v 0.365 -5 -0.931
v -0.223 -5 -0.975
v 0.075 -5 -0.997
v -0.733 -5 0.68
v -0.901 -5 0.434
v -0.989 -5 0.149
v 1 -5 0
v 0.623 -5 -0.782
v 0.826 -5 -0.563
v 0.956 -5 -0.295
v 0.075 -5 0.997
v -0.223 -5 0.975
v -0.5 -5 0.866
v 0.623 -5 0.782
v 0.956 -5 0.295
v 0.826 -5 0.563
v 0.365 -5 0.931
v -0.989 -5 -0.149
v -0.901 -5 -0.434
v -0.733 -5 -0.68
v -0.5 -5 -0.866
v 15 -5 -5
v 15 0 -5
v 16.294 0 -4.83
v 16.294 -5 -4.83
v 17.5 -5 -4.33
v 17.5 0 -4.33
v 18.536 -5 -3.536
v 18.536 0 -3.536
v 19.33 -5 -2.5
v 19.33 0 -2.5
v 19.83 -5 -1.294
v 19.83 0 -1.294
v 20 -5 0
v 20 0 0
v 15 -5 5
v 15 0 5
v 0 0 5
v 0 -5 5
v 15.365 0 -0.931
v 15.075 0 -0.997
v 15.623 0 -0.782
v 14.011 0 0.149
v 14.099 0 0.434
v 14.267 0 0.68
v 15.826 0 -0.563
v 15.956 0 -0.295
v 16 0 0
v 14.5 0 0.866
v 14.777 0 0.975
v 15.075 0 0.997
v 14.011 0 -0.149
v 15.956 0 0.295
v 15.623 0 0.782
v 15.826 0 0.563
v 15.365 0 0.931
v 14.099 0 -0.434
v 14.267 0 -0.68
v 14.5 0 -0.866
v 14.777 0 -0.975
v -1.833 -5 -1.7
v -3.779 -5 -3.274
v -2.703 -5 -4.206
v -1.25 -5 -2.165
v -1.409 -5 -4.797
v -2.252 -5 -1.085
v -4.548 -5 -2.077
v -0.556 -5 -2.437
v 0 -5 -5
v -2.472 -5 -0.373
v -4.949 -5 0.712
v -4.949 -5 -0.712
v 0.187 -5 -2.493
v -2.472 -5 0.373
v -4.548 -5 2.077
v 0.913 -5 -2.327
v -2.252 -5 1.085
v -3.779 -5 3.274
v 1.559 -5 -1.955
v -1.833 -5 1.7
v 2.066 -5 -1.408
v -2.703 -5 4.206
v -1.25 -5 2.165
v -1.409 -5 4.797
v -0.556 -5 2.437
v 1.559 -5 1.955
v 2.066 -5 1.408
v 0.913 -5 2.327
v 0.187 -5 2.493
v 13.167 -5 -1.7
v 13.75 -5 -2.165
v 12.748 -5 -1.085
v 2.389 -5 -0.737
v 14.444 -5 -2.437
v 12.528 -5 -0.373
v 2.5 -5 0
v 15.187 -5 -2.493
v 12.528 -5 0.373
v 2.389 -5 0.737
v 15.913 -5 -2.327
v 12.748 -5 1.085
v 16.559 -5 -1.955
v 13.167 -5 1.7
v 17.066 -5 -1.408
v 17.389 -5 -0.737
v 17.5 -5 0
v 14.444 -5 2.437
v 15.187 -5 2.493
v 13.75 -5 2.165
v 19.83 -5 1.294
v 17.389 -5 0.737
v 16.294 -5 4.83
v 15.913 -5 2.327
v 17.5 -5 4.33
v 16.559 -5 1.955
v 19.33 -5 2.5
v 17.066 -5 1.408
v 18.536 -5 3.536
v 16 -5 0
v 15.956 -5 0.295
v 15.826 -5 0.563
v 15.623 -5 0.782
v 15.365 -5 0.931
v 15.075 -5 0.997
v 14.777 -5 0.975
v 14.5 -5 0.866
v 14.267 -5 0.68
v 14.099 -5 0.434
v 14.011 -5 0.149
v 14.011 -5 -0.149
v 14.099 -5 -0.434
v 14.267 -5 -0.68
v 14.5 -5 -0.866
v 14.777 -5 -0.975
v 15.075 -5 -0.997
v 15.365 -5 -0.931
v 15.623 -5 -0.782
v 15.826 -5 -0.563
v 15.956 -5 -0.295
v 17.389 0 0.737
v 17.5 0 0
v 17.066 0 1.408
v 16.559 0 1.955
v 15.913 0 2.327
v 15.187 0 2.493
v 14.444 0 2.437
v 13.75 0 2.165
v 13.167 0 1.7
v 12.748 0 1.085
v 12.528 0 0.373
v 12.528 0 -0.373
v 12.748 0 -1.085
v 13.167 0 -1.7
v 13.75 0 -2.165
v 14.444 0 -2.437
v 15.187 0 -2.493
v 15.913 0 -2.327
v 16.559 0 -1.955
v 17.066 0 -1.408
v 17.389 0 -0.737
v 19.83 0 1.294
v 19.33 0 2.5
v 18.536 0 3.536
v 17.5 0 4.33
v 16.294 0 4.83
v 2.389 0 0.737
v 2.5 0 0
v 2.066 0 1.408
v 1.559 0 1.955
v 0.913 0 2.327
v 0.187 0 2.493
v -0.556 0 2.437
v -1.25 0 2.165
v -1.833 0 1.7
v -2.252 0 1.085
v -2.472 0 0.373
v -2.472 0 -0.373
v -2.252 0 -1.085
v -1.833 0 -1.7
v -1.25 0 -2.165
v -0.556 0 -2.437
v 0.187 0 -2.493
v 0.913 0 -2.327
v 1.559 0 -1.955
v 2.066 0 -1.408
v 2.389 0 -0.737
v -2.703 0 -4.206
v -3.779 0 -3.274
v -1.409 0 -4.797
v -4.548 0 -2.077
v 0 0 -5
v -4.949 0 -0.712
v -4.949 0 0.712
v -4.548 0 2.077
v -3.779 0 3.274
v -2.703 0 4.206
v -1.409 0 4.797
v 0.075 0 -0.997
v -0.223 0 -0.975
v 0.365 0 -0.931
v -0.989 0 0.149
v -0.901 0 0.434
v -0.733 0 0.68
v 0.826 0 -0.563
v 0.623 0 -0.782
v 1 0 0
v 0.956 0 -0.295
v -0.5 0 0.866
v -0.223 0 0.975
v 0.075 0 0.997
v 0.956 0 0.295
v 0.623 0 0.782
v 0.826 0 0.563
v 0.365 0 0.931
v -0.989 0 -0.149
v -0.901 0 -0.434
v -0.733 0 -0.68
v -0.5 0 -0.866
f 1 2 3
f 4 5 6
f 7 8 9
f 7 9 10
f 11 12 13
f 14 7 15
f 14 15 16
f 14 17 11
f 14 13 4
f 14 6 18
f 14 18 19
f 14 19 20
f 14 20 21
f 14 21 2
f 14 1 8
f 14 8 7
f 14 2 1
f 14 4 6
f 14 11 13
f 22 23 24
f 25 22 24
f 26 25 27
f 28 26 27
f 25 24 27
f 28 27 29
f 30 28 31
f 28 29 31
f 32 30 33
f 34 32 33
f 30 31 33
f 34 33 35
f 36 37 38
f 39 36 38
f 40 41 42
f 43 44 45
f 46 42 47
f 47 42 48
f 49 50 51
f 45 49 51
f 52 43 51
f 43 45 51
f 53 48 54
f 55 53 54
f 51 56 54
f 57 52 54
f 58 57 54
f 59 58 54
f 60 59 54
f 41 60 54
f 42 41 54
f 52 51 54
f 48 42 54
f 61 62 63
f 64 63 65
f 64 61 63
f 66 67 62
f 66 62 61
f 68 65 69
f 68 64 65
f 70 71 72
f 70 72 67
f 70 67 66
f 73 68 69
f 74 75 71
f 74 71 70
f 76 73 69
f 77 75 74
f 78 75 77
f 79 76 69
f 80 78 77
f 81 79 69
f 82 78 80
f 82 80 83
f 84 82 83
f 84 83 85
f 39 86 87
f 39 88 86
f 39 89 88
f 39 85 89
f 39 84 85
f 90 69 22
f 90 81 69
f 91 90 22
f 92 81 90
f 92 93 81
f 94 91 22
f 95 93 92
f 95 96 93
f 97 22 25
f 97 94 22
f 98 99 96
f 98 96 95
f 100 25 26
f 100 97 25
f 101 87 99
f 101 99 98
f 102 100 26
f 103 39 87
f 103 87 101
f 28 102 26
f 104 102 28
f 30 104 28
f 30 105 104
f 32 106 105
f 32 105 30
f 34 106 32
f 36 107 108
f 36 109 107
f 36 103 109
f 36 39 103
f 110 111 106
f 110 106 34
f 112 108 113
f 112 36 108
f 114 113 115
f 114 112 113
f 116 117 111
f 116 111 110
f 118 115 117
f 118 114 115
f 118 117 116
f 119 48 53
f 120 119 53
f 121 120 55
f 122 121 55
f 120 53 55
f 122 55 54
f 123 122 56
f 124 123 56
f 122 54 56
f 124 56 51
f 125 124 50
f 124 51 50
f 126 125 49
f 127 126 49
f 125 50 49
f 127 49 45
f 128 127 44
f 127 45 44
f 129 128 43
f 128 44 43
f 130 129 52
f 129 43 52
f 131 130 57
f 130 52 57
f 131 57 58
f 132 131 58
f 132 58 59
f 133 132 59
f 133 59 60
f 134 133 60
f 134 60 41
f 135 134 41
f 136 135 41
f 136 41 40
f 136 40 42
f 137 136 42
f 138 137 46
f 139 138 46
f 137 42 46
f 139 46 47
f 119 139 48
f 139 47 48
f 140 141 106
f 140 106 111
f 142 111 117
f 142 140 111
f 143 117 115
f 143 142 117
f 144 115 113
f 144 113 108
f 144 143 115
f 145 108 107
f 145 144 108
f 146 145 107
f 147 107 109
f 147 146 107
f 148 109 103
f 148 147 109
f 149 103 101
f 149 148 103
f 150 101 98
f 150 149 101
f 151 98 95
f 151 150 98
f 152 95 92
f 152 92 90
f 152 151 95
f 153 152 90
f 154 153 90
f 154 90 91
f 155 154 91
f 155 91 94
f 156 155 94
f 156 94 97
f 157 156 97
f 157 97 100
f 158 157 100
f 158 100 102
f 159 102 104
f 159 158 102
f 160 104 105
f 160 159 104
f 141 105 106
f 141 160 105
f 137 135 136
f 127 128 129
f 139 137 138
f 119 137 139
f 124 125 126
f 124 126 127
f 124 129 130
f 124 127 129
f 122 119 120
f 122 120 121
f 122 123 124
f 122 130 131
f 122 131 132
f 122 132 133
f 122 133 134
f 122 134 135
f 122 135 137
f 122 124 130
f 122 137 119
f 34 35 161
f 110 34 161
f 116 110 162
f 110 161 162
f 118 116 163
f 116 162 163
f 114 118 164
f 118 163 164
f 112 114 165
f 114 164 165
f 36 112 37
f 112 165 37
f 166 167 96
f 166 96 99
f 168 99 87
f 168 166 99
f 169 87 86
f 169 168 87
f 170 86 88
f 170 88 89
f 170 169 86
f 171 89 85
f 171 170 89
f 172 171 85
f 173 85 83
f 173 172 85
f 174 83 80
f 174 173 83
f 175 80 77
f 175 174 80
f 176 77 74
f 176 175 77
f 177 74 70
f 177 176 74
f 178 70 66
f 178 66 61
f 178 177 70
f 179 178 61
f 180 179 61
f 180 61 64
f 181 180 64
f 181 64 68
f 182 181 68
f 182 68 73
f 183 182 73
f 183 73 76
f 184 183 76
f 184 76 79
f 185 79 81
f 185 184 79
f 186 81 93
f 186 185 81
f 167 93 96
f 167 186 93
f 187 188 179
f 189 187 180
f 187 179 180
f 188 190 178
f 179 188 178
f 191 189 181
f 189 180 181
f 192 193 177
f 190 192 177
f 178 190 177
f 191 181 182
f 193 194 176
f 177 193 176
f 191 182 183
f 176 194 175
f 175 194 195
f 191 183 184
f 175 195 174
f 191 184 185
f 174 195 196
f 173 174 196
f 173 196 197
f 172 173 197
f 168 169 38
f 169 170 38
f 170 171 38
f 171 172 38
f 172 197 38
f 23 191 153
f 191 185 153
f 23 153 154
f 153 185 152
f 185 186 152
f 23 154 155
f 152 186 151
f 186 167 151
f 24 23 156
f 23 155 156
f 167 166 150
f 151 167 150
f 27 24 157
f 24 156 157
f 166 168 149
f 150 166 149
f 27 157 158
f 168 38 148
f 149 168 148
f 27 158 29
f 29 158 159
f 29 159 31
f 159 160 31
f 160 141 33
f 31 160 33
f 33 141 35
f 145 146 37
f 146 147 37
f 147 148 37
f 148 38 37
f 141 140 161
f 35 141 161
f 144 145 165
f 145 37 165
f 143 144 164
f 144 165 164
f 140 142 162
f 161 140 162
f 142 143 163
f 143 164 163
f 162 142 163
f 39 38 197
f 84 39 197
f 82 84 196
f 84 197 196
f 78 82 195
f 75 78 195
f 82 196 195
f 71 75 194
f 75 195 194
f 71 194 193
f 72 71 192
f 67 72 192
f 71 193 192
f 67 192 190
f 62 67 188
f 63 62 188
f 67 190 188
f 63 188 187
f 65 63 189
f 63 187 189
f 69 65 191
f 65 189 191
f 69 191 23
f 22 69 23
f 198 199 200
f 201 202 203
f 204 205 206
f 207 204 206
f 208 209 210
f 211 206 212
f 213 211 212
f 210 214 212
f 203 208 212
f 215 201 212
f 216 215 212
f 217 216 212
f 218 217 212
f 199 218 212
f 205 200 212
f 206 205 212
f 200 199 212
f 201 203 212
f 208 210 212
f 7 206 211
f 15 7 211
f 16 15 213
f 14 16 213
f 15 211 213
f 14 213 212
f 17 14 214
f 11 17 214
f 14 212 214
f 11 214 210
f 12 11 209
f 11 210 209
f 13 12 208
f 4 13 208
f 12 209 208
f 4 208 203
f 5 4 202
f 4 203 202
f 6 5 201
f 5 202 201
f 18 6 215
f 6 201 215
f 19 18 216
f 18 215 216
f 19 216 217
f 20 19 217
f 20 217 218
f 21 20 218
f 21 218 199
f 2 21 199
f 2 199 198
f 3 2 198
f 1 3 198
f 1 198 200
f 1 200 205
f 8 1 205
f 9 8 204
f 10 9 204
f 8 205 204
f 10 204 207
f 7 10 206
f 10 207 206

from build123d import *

# Parameters (mm, degrees)
F0_R     = 2.5
F0_R_2   = 1
F1_DEPTH = 5


with BuildPart() as f1:
    # F0 (on Front) → F1 (new body)
    with BuildSketch(Plane.XZ):
        with BuildLine():
            ThreePointArc((0, -5), (3.535534, -3.535534), (5, 0))
            ThreePointArc((5, 0), (3.535534, 3.535534), (0, 5))
            ThreePointArc((0, 5), (-5, 0), (0, -5))
        make_face()
        Circle(F0_R, mode=Mode.SUBTRACT)
        with BuildLine():
            ThreePointArc((20, 0), (18.535534, 3.535534), (15, 5))
            ThreePointArc((15, 5), (10, 0), (15, -5))
            ThreePointArc((15, -5), (18.535534, -3.535534), (20, 0))
        make_face()
        with Locations((15, 0)):
            Circle(F0_R, mode=Mode.SUBTRACT)
        with BuildLine():
            ThreePointArc((0, 5), (3.535534, 3.535534), (5, 0))
            ThreePointArc((5, 0), (3.535534, -3.535534), (0, -5))
            Line((0, -5), (15, -5))
            ThreePointArc((15, -5), (10, 0), (15, 5))
            Line((15, 5), (0, 5))
        make_face()
        Circle(F0_R_2)
        with Locations((15, 0)):
            Circle(F0_R_2)
    extrude(amount=F1_DEPTH)


solid = f1.part
